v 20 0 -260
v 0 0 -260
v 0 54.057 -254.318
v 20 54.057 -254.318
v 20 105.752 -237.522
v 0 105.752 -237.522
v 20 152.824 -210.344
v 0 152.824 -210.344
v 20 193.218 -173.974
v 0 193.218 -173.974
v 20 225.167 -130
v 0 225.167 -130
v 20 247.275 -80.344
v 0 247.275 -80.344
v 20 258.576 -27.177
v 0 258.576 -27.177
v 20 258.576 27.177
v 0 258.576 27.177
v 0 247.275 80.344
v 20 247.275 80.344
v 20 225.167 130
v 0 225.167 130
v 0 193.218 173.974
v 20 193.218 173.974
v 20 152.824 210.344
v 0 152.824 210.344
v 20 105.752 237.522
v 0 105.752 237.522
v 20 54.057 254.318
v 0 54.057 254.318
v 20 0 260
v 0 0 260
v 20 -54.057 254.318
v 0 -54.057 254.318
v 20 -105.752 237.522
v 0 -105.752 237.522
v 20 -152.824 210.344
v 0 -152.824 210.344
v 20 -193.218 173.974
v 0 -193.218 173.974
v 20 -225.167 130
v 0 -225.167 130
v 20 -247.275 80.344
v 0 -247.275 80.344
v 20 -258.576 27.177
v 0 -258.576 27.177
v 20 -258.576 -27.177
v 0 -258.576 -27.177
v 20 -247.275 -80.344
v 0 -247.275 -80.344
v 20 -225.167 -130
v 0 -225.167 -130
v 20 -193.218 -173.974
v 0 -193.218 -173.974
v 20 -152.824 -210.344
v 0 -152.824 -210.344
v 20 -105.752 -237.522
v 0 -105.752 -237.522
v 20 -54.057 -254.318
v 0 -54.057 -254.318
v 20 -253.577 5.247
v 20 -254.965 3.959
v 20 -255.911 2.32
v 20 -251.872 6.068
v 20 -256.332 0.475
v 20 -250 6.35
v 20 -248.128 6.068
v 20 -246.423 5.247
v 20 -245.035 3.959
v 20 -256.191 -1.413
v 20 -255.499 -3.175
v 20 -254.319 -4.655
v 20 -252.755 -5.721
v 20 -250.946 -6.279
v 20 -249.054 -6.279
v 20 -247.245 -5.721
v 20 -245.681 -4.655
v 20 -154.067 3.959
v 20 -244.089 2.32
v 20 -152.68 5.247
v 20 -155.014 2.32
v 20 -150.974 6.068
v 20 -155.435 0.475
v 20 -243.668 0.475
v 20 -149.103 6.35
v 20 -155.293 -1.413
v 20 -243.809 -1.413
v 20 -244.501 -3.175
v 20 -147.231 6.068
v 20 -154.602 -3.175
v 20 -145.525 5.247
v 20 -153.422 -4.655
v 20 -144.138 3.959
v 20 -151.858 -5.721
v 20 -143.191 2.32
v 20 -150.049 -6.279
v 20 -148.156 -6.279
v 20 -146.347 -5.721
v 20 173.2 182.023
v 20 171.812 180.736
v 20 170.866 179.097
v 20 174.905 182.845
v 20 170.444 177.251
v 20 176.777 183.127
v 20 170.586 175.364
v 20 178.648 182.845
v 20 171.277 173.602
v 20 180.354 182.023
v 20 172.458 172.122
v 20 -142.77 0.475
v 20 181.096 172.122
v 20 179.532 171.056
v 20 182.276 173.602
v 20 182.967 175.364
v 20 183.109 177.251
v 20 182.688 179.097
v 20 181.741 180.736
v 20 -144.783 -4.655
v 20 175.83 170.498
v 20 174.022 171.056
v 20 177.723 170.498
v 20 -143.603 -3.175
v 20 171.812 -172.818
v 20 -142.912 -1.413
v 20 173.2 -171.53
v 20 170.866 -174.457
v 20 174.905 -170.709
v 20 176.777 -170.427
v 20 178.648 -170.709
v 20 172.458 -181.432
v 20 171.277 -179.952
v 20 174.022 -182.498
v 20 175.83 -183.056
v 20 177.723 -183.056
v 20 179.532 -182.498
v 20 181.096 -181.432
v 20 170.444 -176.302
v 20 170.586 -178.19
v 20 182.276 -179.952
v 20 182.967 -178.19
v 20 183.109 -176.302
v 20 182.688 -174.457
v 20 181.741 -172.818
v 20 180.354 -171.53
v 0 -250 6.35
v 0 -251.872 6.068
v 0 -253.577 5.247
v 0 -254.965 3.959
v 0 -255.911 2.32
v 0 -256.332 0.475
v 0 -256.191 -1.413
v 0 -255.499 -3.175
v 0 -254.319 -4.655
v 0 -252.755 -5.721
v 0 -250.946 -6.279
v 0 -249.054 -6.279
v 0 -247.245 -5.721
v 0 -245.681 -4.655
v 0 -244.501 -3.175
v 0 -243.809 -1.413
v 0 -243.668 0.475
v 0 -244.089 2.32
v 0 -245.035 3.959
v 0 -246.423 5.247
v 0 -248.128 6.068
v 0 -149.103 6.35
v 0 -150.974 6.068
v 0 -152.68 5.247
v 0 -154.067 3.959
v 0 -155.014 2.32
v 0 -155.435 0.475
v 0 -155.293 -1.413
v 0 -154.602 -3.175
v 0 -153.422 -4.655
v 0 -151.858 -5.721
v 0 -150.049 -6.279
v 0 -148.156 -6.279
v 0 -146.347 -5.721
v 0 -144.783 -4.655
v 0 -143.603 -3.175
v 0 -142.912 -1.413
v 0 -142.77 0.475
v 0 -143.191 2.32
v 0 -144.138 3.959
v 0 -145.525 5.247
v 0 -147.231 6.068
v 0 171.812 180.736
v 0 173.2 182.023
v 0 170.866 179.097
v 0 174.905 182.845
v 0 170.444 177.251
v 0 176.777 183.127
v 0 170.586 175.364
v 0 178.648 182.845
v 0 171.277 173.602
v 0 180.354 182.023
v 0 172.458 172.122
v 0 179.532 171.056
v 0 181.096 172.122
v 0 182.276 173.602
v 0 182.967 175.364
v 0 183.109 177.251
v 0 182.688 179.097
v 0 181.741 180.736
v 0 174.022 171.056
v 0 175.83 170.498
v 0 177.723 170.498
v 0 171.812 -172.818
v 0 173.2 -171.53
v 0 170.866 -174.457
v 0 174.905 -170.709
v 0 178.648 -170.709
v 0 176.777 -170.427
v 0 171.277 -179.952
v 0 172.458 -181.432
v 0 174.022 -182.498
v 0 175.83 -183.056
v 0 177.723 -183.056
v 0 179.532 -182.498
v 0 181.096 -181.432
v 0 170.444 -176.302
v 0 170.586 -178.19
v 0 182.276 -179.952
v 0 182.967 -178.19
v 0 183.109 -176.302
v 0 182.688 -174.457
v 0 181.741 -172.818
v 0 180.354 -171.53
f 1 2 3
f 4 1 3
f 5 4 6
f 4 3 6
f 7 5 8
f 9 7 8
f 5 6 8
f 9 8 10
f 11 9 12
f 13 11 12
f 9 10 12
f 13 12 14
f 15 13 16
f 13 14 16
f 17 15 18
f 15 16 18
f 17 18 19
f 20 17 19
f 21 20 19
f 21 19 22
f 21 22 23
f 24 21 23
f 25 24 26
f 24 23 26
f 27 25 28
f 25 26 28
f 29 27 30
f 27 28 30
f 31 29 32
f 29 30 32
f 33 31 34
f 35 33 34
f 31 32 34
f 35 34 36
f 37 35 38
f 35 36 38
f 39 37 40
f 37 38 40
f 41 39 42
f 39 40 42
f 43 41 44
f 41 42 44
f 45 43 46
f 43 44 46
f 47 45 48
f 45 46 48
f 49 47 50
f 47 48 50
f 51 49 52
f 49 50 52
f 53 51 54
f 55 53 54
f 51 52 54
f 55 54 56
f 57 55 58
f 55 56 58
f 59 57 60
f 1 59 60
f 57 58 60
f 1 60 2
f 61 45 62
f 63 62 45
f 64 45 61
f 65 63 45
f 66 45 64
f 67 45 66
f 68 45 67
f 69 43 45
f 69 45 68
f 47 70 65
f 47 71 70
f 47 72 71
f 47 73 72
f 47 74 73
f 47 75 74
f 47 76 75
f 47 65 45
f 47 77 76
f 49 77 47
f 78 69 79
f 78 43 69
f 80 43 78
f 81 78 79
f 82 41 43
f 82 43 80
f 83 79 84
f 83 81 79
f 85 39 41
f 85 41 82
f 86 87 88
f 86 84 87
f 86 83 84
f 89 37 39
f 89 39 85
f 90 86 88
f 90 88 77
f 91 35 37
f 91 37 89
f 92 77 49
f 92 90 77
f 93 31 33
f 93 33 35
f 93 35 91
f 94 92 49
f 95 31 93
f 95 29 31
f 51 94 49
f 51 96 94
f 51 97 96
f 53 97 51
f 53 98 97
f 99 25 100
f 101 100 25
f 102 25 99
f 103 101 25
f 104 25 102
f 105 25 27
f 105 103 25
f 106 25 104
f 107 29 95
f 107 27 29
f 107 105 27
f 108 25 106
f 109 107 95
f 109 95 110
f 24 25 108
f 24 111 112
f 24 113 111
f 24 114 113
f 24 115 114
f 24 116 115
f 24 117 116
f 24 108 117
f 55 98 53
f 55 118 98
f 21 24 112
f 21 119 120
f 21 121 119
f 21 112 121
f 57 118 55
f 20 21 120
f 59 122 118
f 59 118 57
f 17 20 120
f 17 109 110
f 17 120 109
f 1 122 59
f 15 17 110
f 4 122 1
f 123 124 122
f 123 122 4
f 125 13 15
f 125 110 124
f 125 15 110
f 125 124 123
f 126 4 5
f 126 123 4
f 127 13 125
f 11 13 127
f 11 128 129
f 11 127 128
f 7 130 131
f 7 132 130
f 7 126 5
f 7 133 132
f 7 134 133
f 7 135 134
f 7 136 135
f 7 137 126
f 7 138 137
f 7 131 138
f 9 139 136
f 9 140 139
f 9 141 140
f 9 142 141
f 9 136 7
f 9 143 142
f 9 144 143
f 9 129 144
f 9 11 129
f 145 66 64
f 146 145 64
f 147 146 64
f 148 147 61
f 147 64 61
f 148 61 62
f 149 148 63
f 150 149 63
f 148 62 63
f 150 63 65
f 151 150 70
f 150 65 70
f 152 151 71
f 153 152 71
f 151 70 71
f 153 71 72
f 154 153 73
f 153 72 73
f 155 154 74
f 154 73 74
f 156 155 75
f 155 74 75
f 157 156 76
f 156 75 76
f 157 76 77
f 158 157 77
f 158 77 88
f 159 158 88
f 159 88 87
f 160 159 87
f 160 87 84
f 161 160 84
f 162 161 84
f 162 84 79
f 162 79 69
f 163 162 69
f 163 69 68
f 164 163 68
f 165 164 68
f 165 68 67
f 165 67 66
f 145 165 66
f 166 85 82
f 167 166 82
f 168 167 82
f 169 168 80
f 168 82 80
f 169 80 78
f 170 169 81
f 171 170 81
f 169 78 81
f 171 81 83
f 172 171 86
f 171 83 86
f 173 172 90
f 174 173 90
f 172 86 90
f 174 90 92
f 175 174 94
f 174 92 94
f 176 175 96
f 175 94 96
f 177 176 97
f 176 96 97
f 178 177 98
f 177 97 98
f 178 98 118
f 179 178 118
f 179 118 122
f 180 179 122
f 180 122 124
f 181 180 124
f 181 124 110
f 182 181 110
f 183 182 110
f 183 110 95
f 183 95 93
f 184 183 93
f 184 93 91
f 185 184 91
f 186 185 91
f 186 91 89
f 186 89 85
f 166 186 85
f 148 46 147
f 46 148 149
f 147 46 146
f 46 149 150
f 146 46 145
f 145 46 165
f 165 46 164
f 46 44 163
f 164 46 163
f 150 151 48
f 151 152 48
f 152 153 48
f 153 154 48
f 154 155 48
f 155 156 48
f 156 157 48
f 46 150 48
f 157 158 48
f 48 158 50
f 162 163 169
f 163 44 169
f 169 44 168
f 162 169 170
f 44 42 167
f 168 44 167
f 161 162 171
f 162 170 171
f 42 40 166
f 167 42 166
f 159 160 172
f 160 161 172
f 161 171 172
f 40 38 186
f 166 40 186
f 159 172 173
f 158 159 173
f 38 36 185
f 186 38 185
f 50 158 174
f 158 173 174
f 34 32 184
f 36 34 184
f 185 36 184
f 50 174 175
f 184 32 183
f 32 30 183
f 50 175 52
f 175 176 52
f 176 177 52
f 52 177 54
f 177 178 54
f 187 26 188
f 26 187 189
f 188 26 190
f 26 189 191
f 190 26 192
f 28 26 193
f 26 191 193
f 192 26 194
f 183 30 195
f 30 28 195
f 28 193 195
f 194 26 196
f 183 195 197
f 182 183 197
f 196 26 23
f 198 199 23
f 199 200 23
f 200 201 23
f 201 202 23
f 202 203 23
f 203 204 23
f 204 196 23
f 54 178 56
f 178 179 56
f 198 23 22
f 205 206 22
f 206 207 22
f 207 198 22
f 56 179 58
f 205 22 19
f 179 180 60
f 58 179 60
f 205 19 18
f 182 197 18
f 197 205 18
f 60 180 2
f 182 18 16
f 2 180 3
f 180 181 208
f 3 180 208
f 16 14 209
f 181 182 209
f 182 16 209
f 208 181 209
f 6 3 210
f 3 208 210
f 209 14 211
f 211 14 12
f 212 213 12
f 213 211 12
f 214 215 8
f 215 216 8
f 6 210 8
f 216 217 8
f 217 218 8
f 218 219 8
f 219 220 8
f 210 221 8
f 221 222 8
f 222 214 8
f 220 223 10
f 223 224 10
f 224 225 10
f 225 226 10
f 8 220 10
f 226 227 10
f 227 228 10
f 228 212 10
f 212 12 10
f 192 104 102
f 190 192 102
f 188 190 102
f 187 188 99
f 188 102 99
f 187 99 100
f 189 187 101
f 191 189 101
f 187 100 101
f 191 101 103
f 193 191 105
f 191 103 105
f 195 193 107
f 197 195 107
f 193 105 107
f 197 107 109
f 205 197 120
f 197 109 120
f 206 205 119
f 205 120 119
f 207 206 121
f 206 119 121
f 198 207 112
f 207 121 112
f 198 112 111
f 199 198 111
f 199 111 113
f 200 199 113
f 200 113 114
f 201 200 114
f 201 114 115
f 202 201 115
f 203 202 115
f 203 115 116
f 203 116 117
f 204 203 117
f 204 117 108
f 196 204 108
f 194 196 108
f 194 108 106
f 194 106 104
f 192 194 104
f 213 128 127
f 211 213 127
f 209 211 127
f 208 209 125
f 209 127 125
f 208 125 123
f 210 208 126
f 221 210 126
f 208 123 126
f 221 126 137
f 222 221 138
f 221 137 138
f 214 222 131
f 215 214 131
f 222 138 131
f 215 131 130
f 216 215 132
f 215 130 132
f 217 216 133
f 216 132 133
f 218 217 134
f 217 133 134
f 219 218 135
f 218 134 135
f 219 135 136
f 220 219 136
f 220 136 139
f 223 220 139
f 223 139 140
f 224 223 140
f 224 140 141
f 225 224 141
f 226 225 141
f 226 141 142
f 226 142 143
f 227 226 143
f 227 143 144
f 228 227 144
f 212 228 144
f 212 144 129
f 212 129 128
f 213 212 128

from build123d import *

# Parameters (mm, degrees)
SKETCH1_R                         = 260
BOSS_EXTRUDE1_DEPTH               = 20
F_1_2_13_TAPPED_HOLE1_D           = 10.71626
F_1_2_13_TAPPED_HOLE1_DEPTH       = 70.4
F_1_2_13_TAPPED_HOLE1_CBORE_D     = 12.7
F_1_2_13_TAPPED_HOLE1_CBORE_DEPTH = 64.5
F_1_2_13_TAPPED_HOLE1_TIP         = 3.219489309


with BuildPart() as part:
    # Sketch1 → Boss-Extrude1 (new body)
    with BuildSketch(Plane(origin=(0, 0, 0), x_dir=(0, 0, -1), z_dir=(1, 0, 0))):
        Circle(SKETCH1_R)
    extrude(amount=BOSS_EXTRUDE1_DEPTH)

    # 1/2-13 Tapped Hole1
    with Locations(Plane(origin=(20, 176.776695297, 176.776695297), x_dir=(0, 0, 1), z_dir=(1, 0, 0))):
        with Locations((0, 0), (-353.553390594, 0), (-176.776695297, 426.776695297), (-176.776695297, 325.879201874)):
            CounterBoreHole(F_1_2_13_TAPPED_HOLE1_D / 2, F_1_2_13_TAPPED_HOLE1_CBORE_D / 2, F_1_2_13_TAPPED_HOLE1_CBORE_DEPTH, depth=F_1_2_13_TAPPED_HOLE1_DEPTH)
            with Locations((0, 0, -(F_1_2_13_TAPPED_HOLE1_DEPTH + F_1_2_13_TAPPED_HOLE1_TIP / 2))):  # 118° drill point
                Cone(0, F_1_2_13_TAPPED_HOLE1_D / 2, F_1_2_13_TAPPED_HOLE1_TIP, mode=Mode.SUBTRACT)


solid = part.part
